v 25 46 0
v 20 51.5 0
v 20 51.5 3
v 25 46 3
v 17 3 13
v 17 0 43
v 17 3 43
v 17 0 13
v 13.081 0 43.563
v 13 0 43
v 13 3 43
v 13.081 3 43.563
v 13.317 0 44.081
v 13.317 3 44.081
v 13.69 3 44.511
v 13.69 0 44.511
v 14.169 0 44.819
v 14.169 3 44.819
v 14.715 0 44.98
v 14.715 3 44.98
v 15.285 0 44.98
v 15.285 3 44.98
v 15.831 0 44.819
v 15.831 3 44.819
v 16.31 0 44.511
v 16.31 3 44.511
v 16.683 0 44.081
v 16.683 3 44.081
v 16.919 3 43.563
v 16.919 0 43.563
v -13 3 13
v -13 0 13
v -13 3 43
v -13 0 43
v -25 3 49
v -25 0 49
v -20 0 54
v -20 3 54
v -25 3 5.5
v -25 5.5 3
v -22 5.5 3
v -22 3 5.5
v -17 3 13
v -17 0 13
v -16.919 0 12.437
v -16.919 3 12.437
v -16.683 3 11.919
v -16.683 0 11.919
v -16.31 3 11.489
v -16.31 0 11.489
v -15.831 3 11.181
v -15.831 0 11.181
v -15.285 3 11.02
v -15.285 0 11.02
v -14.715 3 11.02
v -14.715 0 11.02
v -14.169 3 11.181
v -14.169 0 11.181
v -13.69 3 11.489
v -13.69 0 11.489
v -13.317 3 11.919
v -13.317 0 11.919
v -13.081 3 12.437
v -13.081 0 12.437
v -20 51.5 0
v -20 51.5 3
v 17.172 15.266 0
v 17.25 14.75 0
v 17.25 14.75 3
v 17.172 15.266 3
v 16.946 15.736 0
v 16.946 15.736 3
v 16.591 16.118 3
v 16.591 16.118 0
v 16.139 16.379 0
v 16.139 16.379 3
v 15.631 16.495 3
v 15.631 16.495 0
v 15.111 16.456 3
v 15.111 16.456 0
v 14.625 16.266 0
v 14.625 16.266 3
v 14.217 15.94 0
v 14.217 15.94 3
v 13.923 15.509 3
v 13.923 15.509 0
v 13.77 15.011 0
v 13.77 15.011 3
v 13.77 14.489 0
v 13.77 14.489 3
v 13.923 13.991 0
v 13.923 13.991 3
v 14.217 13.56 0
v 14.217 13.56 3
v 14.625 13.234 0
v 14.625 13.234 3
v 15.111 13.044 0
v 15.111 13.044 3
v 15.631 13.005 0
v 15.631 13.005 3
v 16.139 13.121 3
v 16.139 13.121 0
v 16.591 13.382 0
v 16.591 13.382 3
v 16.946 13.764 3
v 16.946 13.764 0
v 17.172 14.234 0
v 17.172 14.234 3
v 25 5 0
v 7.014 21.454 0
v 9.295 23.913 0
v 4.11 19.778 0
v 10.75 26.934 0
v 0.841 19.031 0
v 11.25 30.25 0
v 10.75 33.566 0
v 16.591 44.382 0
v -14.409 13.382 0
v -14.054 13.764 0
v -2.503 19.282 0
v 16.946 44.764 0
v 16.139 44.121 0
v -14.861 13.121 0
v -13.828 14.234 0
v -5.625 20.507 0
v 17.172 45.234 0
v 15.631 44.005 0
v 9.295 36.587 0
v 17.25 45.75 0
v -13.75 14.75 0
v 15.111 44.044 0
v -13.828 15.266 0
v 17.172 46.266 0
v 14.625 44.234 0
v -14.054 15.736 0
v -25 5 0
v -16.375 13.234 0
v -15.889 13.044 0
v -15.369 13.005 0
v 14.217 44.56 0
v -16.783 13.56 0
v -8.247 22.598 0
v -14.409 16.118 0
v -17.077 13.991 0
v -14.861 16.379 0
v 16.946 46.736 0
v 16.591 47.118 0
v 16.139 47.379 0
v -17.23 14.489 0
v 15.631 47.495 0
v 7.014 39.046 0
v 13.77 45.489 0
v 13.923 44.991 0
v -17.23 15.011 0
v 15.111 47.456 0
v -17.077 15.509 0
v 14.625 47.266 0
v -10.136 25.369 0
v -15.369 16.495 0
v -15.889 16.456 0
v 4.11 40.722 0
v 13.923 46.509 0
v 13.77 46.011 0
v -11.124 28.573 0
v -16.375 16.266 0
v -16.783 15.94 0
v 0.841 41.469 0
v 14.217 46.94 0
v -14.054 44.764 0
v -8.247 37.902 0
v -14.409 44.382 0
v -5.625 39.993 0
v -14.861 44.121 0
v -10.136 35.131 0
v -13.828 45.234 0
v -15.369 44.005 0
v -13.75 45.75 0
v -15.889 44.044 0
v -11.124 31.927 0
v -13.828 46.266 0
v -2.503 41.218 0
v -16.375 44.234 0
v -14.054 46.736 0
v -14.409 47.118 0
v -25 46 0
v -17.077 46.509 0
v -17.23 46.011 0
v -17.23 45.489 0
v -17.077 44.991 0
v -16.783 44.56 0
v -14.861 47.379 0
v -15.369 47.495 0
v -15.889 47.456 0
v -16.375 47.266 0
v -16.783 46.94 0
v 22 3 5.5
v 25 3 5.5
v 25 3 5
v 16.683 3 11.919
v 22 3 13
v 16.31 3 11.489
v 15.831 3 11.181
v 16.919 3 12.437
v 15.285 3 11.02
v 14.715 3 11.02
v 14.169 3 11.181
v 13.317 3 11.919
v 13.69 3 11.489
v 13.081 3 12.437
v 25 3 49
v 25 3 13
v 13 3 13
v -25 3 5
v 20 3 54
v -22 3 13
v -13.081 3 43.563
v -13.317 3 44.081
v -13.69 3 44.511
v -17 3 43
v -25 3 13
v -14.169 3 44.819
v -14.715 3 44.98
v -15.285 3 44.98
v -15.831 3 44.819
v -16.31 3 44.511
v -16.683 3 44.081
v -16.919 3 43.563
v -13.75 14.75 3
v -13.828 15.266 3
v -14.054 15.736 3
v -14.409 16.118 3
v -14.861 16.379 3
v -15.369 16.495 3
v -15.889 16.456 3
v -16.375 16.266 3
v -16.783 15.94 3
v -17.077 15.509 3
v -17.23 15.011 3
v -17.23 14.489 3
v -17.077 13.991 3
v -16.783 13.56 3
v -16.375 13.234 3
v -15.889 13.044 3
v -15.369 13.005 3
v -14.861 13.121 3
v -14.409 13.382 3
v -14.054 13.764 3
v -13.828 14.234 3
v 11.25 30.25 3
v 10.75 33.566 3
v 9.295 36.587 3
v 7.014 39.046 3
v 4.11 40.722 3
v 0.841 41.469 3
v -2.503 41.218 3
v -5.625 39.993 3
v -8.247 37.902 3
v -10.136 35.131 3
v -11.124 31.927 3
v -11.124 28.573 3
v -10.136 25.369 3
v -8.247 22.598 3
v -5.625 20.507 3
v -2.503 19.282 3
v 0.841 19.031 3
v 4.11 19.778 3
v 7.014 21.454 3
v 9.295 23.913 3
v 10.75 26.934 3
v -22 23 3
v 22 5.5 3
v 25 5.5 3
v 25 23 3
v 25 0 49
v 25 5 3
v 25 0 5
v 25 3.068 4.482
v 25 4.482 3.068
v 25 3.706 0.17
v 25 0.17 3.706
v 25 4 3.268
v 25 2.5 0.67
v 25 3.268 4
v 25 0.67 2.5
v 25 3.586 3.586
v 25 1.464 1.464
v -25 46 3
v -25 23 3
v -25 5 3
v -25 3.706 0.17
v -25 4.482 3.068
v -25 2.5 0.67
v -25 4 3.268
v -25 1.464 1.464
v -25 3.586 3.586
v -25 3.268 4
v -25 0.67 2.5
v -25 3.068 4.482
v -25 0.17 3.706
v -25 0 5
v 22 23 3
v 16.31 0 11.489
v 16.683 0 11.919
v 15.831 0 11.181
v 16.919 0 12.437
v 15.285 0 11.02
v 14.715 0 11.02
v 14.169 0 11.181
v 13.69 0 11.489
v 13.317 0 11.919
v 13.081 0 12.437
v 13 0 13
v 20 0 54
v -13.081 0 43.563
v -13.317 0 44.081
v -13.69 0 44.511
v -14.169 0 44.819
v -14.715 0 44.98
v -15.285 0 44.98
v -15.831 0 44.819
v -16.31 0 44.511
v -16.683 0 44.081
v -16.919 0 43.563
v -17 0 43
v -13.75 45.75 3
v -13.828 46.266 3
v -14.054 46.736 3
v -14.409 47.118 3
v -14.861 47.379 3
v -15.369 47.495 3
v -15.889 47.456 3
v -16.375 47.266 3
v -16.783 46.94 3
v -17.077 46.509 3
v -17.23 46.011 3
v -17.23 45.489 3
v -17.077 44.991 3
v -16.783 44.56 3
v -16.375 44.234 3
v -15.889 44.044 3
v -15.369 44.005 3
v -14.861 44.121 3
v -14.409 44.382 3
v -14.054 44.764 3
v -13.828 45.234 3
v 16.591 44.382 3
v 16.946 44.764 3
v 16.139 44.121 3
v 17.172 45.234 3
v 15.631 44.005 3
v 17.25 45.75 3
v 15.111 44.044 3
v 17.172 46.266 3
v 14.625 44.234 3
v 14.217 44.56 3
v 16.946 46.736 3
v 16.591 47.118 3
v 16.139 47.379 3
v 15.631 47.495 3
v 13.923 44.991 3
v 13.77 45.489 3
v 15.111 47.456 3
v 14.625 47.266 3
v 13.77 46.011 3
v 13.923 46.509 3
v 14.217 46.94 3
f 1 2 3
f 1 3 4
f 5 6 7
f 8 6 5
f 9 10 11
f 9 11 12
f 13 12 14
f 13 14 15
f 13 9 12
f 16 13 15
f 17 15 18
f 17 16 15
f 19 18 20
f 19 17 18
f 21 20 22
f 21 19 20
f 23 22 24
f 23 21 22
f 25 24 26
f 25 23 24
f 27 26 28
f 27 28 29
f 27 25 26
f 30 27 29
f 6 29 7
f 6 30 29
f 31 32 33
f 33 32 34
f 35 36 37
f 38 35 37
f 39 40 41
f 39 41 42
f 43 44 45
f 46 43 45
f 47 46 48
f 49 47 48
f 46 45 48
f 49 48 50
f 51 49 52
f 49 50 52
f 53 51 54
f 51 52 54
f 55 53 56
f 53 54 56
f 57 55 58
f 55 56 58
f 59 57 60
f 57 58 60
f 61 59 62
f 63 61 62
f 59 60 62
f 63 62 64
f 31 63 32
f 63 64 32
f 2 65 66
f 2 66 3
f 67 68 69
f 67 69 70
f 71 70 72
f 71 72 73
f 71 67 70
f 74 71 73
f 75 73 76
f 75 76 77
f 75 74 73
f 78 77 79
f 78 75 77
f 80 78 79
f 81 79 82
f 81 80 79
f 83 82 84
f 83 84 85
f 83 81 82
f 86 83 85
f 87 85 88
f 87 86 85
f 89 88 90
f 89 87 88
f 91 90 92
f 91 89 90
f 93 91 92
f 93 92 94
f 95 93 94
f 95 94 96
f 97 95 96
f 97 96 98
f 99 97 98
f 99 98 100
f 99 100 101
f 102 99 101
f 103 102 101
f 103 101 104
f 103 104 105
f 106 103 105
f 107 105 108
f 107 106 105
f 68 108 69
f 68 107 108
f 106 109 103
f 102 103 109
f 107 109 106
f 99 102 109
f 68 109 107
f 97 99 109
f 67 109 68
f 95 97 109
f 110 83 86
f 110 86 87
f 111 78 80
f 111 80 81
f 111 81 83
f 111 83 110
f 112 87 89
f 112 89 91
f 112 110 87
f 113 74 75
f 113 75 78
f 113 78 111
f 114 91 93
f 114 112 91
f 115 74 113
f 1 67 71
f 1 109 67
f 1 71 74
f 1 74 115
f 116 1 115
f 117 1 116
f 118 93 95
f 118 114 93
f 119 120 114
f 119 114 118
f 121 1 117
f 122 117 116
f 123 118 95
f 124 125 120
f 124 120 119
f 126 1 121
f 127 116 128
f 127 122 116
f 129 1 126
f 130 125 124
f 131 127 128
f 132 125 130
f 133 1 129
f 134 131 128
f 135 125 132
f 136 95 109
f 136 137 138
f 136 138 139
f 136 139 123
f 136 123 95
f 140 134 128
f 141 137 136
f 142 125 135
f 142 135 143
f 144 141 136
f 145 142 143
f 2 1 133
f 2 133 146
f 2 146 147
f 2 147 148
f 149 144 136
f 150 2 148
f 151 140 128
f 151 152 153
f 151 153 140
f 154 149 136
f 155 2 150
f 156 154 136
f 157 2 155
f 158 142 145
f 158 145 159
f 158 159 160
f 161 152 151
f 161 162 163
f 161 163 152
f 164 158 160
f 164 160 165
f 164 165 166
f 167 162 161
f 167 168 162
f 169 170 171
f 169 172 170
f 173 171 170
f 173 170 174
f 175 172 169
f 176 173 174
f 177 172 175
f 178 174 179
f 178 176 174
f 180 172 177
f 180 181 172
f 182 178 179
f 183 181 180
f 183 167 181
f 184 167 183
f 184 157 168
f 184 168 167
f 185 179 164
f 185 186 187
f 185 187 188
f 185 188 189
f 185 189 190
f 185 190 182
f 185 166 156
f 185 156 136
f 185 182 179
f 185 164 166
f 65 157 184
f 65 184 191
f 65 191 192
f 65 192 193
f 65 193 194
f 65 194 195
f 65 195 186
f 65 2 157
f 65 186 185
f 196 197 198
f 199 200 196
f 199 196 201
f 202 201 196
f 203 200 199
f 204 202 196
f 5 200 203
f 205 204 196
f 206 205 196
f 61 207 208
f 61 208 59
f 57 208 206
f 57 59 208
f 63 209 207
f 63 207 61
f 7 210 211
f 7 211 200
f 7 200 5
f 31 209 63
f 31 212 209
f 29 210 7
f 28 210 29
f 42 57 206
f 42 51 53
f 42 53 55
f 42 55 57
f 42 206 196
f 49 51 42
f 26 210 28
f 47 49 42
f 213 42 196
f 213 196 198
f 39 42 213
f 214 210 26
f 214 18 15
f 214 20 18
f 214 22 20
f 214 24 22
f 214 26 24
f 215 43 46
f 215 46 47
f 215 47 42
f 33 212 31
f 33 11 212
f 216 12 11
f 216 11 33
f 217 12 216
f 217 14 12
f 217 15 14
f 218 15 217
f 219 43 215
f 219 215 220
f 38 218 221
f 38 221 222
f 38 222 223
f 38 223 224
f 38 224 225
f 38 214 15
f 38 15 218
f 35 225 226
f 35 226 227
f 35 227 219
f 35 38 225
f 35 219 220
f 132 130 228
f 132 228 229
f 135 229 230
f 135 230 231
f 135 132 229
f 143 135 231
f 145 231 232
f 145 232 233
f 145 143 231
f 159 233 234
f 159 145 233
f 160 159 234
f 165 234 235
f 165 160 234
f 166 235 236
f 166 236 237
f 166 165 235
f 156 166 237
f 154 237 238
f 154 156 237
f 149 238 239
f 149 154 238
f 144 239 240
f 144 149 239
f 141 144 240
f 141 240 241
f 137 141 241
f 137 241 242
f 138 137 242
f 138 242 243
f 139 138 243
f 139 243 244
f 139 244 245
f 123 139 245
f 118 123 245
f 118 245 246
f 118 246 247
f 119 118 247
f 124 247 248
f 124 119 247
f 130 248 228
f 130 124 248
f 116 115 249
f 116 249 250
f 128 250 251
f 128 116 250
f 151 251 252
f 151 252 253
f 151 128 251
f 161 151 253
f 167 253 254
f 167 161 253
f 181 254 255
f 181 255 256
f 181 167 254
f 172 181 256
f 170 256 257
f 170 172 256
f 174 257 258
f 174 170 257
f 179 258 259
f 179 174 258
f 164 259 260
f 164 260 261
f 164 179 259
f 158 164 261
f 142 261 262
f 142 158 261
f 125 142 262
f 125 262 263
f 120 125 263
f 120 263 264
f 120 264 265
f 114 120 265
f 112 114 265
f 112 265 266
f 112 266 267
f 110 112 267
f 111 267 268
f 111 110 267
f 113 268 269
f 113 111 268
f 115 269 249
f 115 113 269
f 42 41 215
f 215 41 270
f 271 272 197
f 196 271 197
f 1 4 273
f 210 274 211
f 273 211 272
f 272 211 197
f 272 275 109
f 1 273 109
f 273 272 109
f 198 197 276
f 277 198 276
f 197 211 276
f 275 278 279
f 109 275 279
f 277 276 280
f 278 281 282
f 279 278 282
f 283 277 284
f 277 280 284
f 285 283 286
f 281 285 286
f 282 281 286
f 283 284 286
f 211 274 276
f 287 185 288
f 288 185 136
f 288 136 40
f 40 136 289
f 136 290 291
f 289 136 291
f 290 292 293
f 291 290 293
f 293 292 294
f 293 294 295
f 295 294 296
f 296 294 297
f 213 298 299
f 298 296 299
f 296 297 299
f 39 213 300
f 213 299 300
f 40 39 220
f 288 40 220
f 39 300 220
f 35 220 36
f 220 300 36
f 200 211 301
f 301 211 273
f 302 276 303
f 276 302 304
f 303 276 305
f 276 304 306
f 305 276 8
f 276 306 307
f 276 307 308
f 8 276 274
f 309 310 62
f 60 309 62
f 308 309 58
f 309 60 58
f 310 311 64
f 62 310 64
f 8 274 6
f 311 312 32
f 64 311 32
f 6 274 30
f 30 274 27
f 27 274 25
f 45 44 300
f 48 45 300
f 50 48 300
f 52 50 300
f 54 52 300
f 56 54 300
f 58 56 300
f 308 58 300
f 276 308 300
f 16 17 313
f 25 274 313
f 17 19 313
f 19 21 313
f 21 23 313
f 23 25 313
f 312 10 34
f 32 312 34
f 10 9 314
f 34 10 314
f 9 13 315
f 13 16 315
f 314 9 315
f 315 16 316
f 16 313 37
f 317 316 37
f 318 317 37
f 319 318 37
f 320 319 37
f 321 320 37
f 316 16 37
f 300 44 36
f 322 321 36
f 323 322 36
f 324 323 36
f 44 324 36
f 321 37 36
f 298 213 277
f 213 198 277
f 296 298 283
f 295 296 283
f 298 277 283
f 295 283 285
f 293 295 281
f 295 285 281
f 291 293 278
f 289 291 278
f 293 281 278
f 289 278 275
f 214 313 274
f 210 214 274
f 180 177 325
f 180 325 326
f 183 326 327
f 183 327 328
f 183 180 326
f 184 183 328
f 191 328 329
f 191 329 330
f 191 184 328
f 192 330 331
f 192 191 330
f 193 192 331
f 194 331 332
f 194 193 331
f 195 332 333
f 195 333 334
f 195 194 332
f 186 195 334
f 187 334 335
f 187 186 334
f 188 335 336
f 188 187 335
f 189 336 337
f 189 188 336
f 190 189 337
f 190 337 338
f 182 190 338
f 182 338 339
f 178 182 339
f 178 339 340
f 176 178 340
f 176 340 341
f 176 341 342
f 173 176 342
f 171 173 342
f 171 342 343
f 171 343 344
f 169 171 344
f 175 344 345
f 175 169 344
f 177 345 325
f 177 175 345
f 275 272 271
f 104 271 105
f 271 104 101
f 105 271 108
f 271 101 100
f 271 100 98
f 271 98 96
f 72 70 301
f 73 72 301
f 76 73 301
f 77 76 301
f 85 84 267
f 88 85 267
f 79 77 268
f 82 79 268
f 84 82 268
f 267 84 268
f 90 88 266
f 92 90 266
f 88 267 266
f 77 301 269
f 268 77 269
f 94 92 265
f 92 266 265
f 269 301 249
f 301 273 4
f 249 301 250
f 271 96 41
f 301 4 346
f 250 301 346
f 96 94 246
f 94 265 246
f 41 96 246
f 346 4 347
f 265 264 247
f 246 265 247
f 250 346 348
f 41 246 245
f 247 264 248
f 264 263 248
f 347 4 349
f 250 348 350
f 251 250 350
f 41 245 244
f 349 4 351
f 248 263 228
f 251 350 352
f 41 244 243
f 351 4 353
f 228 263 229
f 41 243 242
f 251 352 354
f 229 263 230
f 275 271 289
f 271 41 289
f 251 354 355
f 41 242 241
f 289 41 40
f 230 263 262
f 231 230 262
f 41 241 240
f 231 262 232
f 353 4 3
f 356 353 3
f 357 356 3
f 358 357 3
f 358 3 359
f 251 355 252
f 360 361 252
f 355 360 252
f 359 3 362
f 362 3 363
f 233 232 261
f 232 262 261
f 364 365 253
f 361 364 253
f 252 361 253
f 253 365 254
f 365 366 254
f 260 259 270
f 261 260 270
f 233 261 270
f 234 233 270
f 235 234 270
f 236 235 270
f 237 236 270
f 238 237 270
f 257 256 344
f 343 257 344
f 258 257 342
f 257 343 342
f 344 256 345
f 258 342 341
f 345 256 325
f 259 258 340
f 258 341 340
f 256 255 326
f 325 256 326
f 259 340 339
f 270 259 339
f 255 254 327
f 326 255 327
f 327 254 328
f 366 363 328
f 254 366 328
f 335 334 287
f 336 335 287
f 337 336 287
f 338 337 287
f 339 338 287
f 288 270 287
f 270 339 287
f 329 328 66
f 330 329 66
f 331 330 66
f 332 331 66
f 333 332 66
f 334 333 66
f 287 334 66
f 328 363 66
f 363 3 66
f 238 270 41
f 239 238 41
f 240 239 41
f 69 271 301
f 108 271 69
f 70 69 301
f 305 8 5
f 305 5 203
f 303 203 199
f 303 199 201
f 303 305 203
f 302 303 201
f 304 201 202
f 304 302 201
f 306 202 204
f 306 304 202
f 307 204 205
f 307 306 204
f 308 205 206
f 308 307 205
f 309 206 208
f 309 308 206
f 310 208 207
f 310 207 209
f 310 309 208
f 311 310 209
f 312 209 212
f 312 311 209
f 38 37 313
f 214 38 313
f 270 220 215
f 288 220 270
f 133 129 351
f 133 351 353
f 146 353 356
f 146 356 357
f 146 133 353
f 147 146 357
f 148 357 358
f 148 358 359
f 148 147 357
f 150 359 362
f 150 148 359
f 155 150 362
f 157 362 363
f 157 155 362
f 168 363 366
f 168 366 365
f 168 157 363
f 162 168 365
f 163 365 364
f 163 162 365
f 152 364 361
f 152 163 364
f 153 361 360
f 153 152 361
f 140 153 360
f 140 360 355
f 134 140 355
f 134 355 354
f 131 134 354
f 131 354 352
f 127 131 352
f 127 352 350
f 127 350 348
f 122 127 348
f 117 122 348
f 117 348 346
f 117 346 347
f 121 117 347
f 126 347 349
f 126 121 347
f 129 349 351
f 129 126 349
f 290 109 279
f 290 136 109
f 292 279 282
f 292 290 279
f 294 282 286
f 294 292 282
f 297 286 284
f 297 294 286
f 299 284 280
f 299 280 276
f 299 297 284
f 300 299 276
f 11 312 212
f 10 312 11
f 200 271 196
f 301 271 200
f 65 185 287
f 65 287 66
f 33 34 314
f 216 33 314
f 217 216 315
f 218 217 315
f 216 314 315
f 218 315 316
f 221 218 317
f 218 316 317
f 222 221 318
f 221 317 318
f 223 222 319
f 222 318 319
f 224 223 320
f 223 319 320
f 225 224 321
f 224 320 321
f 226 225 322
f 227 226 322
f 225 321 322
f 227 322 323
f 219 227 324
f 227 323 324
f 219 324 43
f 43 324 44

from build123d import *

# Parameters (mm, degrees)
ESQUISSE1_R        = 11.25
ESQUISSE1_R_2      = 1.75
BOSS_EXTRU_1_DEPTH = 3
BOSS_EXTRU_2_DEPTH = 3
CONG_1_R           = 2
CONG_2_R           = 5
BOSS_EXTRU_3_DEPTH = 3
BOSS_EXTRU_4_START = -50
BOSS_EXTRU_4_DEPTH = 3


with BuildPart() as part:
    # Esquisse1 → Boss.-Extru.1 (new body)
    with BuildSketch(Plane.XY):
        Polygon((-20, 51.5), (20, 51.5), (25, 46), (25, 0), (-25, 0), (-25, 46), align=None)
        with Locations((0, 30.25)):
            Circle(ESQUISSE1_R, mode=Mode.SUBTRACT)
        with Locations((15.5, 45.75)):
            Circle(ESQUISSE1_R_2, mode=Mode.SUBTRACT)
        with Locations((15.5, 14.75)):
            Circle(ESQUISSE1_R_2, mode=Mode.SUBTRACT)
        with Locations((-15.5, 14.75)):
            Circle(ESQUISSE1_R_2, mode=Mode.SUBTRACT)
        with Locations((-15.5, 45.75)):
            Circle(ESQUISSE1_R_2, mode=Mode.SUBTRACT)
    extrude(amount=BOSS_EXTRU_1_DEPTH)

    # Esquisse2 → Boss.-Extru.2 (add)
    with BuildSketch(Plane.XZ):
        Polygon((-20, 54), (20, 54), (25, 49), (25, 0), (-25, 0), (-25, 49), align=None)
        with BuildLine():
            Line((17, 43), (17, 13))
            ThreePointArc((17, 13), (15, 11), (13, 13))
            Line((13, 13), (13, 43))
            ThreePointArc((13, 43), (15, 45), (17, 43))
        make_face(mode=Mode.SUBTRACT)
        with BuildLine():
            Line((-17, 43), (-17, 13))
            ThreePointArc((-17, 13), (-15, 11), (-13, 13))
            Line((-13, 13), (-13, 43))
            ThreePointArc((-13, 43), (-15, 45), (-17, 43))
        make_face(mode=Mode.SUBTRACT)
    extrude(amount=-BOSS_EXTRU_2_DEPTH)

    # Congé1
    cong_1_edges = [part.edges().sort_by_distance(p)[0] for p in [
        (0, 3, 3),
    ]]
    fillet(cong_1_edges, radius=CONG_1_R)

    # Congé2
    cong_2_edges = [part.edges().sort_by_distance(p)[0] for p in [
        (0, 0, 0),
    ]]
    fillet(cong_2_edges, radius=CONG_2_R)

    # Esquisse3 → Boss.-Extru.3 (add)
    with BuildSketch(Plane.ZY.offset(25)):
        Polygon((13, 3), (3, 23), (3, 5.5), (5.5, 3), align=None)
    extrude(amount=-BOSS_EXTRU_3_DEPTH)

    # Esquisse3<3> → Boss.-Extru.4 (add)
    with BuildSketch(Plane.ZY.offset(25).offset(BOSS_EXTRU_4_START)):
        Polygon((13, 3), (3, 23), (3, 5.5), (5.5, 3), align=None)
    extrude(amount=BOSS_EXTRU_4_DEPTH)


solid = part.part
